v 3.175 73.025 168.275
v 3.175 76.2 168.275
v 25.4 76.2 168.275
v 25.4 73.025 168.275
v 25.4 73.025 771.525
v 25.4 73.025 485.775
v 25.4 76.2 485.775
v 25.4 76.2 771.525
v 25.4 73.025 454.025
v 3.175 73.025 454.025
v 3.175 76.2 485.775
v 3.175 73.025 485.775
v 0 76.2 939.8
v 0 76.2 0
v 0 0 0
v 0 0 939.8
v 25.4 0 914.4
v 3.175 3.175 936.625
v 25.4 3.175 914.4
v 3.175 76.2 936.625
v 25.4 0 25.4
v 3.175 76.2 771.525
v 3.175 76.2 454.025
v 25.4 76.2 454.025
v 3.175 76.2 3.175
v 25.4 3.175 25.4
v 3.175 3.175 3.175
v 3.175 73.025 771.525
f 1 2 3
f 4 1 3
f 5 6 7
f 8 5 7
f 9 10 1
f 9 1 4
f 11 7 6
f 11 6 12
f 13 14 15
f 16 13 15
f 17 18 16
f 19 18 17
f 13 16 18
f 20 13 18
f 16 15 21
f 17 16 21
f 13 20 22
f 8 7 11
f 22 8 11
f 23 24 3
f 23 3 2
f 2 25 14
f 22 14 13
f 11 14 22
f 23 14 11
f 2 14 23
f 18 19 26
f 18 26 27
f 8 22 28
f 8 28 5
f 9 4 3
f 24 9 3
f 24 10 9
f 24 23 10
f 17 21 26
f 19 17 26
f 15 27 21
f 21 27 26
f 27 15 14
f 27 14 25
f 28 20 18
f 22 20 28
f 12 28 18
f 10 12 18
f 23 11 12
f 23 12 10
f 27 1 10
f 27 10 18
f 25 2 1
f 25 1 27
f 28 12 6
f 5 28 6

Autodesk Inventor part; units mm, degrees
ref_plane "YZ Plane" through (0, 0, 0) normal (1, 0, 0) x (0, 1, 0)
ref_plane "XZ Plane" through (0, 0, 0) normal (0, 1, 0) x (-1, 0, 0)
ref_plane "XY Plane" through (0, 0, 0) normal (0, 0, 1) x (1, 0, 0)
sketch "Sketch1" plane through (0, 0, 0) normal (0, 0, 1) x (1, 0, 0)
  line L0 (0, 0) -> (25.4, 0)
  line L1 (25.4, 76.2) -> (0, 76.2)
  line L2 (0, 76.2) -> (0, 0)
  line L3 (25.4, 3.175) -> (3.175, 3.175)
  line L4 (3.175, 3.175) -> (3.175, 73.025)
  line L5 (3.175, 73.025) -> (25.4, 73.025)
  line L6 (25.4, 0) -> (25.4, 3.175)
  line L7 (25.4, 73.025) -> (25.4, 76.2)
  dimension "d0" = 76.2
  dimension "d1" = 25.4
  dimension "d2" = 3.175
  dimension "d3" = 3.175
  dimension "d4" = 3.175
extrude "Extrusion1" add sketch "Sketch1" along normal blind 939.8
sketch "Sketch2" plane through (0, 76.2, 0) normal (0, 1, 0) x (1, 0, 0)
  line L0 (0, -939.8) -> (25.4, -939.8) projected
  line L1 (25.4, 0) -> (25.4, -939.8) projected
  line L2 (25.4, 0) -> (0, 0) projected
  line L3 (0, 0) -> (0, -939.8) projected
  line L4 (0, -939.8) -> (25.4, -914.4)
  line L5 (0, 0) -> (25.4, -25.4)
  line L6 (3.175, -936.625) -> (3.175, -771.525)
  line L7 (3.175, -771.525) -> (25.4, -771.525)
  line L8 (3.175, -3.175) -> (3.175, -168.275)
  line L9 (3.175, -168.275) -> (25.4, -168.275)
  dimension "d7" = 45
  dimension "d8" = 3.175
  dimension "d9" = 165.1
  dimension "d10" = 165.1
extrude "Extrusion2" cut sketch "Sketch2" against normal through all contours L4 L1 L0 | L2 L1 L5
extrude "Extrusion3" cut sketch "Sketch2" against normal up to next contours L6 L7 L1 L4 | L5 L1 L9 L8
sketch "Sketch3" plane through (0, 76.2, 939.8) normal (0, 1, 0) x (1, 0, 0)
  line L0 (25.4, 771.525) -> (25.4, 168.275) projected
  line L1 (25.4, 454.025) -> (3.175, 454.025)
  line L2 (3.175, 454.025) -> (3.175, 485.775)
  line L3 (3.175, 485.775) -> (25.4, 485.775)
  line L4 (25.4, 485.775) -> (25.4, 454.025)
  point P0 (0, 0)
  dimension "d15" = 31.75
  dimension "d16" = 22.225
  dimension "d17" = 454.025
extrude "Extrusion4" cut sketch "Sketch3" against normal blind 25.4
equation "\"d3\" = d2"
equation "\"d4\" = d2"
equation "\"d10\" = d9"
properties part number "frame U 1 by 3 long 2"
